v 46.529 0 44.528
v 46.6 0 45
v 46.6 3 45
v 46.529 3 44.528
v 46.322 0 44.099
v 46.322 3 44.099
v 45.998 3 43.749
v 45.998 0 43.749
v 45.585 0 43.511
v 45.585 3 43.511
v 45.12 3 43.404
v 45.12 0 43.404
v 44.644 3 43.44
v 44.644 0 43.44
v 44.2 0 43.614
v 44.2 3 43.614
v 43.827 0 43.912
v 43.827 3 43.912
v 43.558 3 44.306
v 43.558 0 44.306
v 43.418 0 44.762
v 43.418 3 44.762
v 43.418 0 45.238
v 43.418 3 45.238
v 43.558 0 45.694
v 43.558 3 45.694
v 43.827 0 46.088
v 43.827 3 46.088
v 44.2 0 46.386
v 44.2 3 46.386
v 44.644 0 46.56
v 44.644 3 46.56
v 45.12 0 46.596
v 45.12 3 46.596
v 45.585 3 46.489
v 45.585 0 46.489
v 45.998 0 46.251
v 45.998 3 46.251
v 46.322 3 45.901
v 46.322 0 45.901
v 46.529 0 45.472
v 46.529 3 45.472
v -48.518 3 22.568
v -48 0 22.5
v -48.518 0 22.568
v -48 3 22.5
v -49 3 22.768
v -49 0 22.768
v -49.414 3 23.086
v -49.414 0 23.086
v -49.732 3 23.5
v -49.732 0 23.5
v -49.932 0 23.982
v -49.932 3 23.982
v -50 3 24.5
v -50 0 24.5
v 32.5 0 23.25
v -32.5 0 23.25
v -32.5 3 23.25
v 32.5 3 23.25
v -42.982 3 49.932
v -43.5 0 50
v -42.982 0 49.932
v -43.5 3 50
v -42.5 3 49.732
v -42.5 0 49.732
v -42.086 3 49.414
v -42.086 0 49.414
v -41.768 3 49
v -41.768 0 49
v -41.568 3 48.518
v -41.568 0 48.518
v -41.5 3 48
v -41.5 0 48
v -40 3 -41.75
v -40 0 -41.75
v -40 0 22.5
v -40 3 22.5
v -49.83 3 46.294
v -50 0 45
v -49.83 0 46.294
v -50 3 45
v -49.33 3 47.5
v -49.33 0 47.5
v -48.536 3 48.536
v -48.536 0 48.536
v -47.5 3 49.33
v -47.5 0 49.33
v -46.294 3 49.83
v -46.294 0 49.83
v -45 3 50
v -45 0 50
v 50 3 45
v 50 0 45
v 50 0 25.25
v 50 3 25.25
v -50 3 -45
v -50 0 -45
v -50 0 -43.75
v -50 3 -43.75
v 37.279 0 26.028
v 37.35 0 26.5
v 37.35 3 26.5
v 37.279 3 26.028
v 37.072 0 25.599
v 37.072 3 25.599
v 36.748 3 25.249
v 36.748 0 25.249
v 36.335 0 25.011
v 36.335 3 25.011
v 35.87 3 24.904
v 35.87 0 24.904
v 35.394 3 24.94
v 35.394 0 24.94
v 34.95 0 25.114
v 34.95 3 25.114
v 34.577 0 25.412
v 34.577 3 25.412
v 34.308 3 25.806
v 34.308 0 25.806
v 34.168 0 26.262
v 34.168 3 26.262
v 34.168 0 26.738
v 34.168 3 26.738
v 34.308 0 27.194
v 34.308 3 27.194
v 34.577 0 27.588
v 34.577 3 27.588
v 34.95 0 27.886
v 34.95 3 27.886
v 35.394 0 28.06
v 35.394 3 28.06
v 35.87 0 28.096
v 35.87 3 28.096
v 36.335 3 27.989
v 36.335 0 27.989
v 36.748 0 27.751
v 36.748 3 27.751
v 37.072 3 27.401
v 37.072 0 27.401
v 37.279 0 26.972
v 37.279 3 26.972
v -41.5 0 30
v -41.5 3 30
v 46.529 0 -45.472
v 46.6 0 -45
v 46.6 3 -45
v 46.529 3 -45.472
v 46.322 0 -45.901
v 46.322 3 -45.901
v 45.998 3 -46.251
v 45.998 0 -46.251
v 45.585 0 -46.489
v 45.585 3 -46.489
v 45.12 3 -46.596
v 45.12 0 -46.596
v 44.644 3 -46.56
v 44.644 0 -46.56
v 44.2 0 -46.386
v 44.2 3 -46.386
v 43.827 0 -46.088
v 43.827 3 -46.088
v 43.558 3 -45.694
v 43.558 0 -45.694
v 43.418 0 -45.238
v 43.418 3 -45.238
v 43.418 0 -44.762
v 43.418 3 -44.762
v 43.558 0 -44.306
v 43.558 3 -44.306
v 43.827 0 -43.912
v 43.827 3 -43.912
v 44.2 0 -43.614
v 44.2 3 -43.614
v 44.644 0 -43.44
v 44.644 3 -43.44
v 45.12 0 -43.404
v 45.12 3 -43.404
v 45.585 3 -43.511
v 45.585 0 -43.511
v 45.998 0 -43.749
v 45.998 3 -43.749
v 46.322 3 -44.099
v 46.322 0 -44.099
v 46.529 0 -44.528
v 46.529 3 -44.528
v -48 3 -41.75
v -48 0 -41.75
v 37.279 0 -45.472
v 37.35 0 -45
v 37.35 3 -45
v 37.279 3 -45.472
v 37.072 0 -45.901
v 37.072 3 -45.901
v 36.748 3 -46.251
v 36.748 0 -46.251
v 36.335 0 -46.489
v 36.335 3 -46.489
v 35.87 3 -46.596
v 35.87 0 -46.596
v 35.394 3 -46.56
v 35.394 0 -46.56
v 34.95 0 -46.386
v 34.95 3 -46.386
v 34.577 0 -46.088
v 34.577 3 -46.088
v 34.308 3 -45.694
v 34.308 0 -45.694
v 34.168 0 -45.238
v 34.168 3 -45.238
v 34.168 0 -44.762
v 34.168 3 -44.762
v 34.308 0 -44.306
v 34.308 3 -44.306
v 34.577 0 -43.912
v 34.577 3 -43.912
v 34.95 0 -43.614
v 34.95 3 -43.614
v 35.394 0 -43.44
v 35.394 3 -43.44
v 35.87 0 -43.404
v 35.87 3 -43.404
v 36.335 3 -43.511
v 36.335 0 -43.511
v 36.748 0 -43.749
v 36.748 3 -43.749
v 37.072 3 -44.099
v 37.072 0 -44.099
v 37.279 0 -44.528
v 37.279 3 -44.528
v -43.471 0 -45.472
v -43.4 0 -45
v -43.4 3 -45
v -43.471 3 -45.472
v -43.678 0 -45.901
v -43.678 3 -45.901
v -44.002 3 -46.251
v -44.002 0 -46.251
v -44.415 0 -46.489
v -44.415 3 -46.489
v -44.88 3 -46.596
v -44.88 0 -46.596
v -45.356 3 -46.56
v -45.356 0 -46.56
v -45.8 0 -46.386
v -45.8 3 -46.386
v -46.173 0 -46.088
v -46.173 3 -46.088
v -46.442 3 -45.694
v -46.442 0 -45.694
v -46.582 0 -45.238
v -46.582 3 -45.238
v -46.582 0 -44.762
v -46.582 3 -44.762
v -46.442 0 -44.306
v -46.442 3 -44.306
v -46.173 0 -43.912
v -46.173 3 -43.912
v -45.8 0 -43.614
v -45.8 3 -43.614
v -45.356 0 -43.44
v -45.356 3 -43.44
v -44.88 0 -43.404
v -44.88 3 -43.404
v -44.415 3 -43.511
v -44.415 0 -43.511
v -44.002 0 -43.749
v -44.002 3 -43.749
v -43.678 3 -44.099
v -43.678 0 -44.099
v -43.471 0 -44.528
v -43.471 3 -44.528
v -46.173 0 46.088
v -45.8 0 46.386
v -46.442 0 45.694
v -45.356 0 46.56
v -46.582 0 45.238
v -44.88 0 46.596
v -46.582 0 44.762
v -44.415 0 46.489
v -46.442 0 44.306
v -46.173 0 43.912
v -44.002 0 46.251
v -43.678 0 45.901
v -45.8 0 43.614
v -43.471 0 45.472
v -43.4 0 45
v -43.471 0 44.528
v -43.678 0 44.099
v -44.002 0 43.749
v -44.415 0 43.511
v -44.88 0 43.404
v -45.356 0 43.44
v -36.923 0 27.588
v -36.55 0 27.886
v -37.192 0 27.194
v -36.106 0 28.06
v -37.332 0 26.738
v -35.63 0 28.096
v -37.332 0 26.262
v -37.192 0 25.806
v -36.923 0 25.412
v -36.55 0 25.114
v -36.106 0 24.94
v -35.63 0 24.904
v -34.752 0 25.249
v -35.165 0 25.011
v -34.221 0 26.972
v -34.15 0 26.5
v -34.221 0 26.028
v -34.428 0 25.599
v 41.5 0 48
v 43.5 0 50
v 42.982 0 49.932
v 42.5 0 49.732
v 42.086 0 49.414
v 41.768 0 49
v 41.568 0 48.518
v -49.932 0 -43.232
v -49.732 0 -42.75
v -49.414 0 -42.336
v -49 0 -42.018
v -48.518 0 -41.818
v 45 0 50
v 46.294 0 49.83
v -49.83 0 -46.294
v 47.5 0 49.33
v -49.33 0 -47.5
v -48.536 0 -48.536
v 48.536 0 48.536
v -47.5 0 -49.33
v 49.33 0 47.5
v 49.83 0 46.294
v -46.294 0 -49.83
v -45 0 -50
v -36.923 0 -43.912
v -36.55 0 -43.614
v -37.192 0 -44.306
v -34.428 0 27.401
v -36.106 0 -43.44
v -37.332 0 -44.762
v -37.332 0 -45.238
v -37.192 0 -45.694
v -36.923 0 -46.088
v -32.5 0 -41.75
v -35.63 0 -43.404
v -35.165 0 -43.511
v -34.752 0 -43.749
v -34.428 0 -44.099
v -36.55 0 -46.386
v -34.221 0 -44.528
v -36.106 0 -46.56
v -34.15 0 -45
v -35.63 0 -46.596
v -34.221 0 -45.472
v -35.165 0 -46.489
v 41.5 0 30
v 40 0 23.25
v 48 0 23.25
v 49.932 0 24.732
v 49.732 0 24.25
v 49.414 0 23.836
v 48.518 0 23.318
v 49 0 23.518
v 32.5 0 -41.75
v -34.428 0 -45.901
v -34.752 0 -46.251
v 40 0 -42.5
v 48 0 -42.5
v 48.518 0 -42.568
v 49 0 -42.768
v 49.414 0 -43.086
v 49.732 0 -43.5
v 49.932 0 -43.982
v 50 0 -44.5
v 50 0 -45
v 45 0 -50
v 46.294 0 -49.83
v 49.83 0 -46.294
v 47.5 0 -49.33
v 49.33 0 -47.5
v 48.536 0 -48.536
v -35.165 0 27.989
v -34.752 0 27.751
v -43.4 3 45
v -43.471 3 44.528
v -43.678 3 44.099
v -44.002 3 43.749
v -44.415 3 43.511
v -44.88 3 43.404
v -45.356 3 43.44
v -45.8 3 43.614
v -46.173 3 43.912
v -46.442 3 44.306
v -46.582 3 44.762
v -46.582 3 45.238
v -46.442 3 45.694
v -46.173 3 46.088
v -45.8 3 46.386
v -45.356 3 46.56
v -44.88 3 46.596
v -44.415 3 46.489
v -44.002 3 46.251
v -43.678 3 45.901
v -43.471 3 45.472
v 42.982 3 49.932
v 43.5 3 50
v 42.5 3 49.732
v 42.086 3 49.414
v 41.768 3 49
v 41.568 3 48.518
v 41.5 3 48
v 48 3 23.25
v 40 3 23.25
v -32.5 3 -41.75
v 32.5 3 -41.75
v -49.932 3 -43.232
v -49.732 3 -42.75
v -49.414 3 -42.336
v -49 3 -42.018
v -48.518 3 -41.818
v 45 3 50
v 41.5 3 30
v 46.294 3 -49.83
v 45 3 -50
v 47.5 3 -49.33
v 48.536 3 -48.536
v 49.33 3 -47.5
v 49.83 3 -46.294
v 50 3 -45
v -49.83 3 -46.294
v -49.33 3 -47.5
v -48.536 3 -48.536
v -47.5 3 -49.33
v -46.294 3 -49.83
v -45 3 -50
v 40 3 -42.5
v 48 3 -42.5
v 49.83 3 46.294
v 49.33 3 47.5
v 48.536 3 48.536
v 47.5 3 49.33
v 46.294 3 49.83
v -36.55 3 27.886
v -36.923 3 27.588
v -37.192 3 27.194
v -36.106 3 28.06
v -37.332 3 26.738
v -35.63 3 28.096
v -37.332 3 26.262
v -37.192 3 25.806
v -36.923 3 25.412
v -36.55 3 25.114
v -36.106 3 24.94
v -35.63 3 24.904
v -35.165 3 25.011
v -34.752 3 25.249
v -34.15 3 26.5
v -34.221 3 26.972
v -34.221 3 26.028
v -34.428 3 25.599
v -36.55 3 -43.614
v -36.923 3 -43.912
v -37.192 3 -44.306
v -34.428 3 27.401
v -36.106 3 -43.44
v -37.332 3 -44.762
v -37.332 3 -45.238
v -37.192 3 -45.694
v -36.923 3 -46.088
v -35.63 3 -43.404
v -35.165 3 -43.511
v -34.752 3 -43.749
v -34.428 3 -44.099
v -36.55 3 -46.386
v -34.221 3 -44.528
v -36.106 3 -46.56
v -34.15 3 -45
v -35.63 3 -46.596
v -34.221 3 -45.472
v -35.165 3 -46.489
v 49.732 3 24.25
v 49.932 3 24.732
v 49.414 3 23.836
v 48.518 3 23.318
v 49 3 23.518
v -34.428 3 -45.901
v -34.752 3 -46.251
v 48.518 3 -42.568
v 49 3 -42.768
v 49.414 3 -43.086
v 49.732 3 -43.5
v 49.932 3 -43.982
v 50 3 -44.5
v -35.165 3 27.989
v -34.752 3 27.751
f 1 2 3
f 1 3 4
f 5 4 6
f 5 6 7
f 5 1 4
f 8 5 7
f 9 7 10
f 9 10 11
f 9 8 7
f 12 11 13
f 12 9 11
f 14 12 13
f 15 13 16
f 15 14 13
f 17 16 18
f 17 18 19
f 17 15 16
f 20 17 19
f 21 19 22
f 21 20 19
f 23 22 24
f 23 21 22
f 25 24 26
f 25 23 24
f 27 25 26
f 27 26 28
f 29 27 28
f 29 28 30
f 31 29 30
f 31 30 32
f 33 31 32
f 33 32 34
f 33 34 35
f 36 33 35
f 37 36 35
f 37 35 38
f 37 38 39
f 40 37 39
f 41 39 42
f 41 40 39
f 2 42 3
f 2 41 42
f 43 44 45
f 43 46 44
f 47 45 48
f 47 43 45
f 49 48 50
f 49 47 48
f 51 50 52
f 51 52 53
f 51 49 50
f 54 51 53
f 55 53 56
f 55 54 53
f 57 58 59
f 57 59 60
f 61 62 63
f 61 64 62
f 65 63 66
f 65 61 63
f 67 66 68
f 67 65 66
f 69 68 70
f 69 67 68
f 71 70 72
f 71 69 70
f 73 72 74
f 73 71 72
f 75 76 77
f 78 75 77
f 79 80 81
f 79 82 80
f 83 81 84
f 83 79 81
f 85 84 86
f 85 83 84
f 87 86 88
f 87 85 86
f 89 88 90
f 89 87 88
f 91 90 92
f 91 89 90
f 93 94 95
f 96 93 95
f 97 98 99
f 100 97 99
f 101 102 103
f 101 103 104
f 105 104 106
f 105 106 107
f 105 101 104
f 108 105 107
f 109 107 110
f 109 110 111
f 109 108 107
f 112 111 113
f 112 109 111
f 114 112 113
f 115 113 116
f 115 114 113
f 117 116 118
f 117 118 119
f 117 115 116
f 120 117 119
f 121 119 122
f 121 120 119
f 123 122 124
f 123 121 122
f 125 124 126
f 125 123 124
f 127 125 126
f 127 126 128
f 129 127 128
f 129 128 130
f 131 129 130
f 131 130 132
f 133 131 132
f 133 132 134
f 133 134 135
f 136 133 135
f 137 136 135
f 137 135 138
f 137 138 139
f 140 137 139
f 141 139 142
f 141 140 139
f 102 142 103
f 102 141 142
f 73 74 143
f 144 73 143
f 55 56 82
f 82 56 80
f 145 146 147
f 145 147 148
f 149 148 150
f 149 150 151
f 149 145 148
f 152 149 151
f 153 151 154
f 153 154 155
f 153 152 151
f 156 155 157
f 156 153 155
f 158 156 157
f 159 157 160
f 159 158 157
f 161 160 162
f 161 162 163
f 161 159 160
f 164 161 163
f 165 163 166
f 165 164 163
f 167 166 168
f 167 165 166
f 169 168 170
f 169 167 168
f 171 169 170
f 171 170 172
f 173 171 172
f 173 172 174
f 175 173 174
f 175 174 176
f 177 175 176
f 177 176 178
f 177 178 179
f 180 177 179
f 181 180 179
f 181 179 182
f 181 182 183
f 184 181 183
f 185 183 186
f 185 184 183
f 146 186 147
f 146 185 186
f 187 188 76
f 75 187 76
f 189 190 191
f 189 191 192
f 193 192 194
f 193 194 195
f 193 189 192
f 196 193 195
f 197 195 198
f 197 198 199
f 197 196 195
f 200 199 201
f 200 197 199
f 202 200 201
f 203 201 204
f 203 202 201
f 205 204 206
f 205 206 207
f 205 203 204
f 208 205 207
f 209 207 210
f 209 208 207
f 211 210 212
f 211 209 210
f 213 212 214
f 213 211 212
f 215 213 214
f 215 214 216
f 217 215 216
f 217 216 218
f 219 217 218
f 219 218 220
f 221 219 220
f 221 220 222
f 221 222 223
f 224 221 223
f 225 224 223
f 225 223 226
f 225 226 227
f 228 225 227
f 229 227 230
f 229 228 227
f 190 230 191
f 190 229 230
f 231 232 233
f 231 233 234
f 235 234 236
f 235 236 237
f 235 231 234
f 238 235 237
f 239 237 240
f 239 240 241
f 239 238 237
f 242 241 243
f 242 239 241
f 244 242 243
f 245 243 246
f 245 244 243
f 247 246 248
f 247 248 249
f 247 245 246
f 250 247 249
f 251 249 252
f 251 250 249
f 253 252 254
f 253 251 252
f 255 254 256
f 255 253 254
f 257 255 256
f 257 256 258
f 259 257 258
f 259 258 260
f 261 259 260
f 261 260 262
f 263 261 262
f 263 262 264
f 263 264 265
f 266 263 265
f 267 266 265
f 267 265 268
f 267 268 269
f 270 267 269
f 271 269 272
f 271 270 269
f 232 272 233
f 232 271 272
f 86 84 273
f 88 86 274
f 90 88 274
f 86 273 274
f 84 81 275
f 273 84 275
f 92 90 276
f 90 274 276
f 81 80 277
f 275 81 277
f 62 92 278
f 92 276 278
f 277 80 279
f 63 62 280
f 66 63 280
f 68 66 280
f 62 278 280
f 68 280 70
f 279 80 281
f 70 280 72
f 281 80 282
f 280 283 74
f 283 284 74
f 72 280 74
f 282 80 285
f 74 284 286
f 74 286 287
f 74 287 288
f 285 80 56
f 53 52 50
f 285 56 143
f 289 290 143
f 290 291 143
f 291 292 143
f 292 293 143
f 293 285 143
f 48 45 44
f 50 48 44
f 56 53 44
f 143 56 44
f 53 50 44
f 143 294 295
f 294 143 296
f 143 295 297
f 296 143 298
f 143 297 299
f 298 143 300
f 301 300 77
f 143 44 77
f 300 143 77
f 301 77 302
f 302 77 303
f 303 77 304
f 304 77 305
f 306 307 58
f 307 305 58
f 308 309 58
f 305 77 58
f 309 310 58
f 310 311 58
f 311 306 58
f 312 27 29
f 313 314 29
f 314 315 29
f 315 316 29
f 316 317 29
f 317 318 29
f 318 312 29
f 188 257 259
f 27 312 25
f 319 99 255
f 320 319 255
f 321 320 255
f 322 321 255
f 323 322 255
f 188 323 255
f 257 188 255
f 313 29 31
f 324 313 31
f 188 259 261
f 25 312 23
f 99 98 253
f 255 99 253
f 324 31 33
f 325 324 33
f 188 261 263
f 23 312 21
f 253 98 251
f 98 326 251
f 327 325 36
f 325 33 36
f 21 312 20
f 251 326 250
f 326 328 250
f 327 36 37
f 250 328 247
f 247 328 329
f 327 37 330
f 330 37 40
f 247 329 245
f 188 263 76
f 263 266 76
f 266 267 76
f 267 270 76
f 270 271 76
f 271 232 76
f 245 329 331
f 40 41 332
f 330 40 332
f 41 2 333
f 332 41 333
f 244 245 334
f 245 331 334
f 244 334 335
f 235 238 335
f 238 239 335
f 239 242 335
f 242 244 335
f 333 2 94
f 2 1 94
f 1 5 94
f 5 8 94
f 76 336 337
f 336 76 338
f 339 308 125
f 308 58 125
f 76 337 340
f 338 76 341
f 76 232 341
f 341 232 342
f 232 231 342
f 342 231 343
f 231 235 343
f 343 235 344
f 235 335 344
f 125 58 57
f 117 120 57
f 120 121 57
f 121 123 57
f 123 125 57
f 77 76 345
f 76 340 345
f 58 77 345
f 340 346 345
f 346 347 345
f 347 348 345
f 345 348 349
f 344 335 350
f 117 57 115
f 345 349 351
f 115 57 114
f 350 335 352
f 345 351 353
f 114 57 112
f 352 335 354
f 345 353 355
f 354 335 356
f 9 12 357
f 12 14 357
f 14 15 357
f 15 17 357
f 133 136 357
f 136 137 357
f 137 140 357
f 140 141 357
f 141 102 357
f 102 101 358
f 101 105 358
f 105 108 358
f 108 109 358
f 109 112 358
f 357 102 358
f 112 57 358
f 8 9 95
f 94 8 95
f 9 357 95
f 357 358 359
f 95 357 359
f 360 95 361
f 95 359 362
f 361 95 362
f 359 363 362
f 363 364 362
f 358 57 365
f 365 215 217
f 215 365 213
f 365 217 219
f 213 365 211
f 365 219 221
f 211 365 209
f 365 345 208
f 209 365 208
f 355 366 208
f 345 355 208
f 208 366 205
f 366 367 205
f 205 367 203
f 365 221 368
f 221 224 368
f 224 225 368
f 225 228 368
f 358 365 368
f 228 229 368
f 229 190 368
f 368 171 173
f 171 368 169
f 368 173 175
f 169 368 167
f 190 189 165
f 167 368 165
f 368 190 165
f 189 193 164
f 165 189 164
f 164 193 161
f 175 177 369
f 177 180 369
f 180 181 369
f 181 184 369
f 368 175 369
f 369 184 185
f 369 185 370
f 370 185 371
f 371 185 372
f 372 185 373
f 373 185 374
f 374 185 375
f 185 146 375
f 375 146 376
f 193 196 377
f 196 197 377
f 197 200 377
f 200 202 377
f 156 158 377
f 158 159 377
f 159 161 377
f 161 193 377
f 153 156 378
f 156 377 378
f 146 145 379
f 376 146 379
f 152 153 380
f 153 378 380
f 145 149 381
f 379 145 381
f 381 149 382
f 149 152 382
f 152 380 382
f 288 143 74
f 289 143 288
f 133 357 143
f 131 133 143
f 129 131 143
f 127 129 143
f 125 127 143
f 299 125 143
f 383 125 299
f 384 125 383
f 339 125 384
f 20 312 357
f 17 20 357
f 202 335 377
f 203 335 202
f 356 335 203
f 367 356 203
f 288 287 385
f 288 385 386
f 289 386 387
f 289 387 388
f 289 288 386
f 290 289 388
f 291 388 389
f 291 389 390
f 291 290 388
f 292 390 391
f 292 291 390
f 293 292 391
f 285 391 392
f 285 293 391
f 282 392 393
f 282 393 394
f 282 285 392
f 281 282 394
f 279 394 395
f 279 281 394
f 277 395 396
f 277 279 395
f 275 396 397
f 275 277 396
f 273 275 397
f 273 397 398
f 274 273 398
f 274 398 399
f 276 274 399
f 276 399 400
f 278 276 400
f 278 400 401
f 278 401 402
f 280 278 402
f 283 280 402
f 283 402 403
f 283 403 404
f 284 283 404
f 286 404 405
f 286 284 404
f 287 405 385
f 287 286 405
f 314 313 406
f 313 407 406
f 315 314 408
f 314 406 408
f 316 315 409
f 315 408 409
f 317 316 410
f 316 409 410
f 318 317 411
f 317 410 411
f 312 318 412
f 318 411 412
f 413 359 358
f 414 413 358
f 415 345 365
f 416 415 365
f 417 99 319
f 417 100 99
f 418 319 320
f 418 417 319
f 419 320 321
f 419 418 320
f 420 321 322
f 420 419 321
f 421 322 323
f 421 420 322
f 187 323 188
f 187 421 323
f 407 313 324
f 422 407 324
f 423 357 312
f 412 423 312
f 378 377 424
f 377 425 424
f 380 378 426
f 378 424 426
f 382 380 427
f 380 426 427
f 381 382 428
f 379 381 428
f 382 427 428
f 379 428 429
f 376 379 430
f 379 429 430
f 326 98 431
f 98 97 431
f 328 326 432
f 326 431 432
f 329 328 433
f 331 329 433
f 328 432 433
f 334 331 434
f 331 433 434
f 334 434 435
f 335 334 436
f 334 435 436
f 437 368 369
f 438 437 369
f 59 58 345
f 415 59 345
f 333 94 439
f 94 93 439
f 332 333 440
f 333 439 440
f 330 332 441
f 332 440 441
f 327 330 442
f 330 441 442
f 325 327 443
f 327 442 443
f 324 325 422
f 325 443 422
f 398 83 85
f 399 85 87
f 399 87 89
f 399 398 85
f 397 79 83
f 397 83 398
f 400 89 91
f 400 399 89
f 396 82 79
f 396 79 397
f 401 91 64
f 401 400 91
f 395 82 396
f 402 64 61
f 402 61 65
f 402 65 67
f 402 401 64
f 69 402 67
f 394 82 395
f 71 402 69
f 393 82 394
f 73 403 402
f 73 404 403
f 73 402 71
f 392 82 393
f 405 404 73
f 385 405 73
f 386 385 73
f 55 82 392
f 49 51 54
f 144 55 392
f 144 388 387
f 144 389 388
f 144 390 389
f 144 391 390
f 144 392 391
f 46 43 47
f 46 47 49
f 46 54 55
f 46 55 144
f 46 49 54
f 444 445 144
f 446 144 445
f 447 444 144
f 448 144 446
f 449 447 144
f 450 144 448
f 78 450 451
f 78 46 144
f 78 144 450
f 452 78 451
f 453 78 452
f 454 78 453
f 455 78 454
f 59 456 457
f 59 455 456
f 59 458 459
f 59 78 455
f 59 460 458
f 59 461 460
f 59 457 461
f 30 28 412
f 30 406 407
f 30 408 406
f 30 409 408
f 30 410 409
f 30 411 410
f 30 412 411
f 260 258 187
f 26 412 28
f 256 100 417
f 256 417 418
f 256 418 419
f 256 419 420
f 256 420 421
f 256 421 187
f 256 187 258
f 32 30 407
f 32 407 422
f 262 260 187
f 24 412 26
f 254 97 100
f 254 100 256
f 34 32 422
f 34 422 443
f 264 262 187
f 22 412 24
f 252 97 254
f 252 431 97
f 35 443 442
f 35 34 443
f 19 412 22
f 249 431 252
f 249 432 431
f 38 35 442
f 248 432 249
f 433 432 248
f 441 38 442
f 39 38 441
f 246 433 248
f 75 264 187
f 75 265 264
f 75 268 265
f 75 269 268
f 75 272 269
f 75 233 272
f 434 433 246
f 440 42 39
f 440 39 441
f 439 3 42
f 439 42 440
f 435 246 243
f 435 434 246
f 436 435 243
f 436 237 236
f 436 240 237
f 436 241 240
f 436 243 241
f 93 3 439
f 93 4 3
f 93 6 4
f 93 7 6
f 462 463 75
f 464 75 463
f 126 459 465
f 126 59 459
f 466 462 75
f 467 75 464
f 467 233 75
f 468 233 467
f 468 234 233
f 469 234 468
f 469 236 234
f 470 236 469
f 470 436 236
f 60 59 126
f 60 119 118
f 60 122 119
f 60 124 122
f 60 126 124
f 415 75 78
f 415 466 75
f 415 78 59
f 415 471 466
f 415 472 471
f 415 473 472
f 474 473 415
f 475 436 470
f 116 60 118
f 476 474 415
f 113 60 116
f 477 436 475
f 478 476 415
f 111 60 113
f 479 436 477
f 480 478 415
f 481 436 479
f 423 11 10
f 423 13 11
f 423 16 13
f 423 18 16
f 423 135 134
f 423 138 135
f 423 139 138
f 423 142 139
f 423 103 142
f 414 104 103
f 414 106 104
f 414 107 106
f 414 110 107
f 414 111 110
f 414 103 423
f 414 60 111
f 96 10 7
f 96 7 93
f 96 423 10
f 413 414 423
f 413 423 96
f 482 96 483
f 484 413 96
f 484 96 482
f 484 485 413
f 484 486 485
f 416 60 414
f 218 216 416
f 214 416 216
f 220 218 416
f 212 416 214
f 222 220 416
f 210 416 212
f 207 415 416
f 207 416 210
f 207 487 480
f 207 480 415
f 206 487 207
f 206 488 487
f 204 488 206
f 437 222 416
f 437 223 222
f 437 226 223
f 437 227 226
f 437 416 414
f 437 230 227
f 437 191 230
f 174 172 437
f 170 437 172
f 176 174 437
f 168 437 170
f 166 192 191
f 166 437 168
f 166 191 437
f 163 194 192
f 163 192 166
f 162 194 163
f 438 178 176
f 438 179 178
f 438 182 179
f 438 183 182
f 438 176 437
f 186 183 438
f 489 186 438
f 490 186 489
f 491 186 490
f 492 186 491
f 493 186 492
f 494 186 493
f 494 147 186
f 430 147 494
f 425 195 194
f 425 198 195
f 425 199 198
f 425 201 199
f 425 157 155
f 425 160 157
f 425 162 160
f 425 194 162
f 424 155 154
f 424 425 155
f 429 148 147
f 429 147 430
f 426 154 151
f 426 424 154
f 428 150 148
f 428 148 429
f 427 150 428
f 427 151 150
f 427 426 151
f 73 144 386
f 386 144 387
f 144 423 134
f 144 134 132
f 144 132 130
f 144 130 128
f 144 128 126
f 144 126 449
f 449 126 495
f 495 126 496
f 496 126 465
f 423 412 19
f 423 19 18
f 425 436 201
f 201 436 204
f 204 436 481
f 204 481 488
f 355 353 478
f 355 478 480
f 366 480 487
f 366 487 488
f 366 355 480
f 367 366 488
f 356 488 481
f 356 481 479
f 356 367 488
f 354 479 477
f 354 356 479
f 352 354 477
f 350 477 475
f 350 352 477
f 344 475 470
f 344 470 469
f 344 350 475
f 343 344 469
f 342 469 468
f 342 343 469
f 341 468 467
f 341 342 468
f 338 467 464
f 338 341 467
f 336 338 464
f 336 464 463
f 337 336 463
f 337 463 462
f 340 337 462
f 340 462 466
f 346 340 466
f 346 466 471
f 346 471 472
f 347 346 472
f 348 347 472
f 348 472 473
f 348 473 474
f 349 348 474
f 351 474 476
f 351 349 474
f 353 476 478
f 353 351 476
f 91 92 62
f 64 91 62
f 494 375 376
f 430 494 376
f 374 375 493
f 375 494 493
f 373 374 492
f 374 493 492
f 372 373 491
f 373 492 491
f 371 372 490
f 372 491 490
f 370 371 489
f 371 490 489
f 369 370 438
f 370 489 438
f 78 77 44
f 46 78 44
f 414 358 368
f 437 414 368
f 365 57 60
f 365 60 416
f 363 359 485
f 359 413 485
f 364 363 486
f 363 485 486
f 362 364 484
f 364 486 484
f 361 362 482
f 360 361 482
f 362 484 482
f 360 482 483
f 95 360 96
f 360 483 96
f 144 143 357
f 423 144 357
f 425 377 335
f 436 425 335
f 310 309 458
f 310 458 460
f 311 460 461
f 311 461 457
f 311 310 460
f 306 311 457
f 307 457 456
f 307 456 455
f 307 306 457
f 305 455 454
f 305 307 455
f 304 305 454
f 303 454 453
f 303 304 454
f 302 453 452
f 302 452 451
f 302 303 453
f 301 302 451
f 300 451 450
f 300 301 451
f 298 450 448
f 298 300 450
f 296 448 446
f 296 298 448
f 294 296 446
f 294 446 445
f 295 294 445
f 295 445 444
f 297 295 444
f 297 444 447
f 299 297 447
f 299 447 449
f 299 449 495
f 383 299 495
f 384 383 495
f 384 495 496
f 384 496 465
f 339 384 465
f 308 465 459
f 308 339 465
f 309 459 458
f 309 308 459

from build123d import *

# Parameters (mm, degrees)
SKETCH1_R           = 1.6
SKETCH1_W           = 65
SKETCH1_H           = 65
BOSS_EXTRUDE1_DEPTH = 3
FILLET1_R           = 2
FILLET2_R           = 5


with BuildPart() as part:
    # Sketch1 → Boss-Extrude1 (new body)
    with BuildSketch(Plane(origin=(0, 0, 0), x_dir=(1, 0, 0), z_dir=(0, 1, 0))):
        Polygon((-50, 50), (-50, 41.75), (-40, 41.75), (-40, -22.5), (-50, -22.5), (-50, -50), (-41.5, -50), (-41.5, -30), (41.5, -30), (41.5, -50), (50, -50), (50, -23.25), (40, -23.25), (40, 42.5), (50, 42.5), (50, 50), align=None)
        with Locations((-45, -45)):
            Circle(SKETCH1_R, mode=Mode.SUBTRACT)
        with Locations((-35.75, -26.5)):
            Circle(SKETCH1_R, mode=Mode.SUBTRACT)
        with Locations((45, -45)):
            Circle(SKETCH1_R, mode=Mode.SUBTRACT)
        with Locations((35.75, -26.5)):
            Circle(SKETCH1_R, mode=Mode.SUBTRACT)
        with Locations((0, 9.25)):
            Rectangle(SKETCH1_W, SKETCH1_H, mode=Mode.SUBTRACT)
        with Locations((-45, 45)):
            Circle(SKETCH1_R, mode=Mode.SUBTRACT)
        with Locations((-35.75, 45)):
            Circle(SKETCH1_R, mode=Mode.SUBTRACT)
        with Locations((35.75, 45)):
            Circle(SKETCH1_R, mode=Mode.SUBTRACT)
        with Locations((45, 45)):
            Circle(SKETCH1_R, mode=Mode.SUBTRACT)
    extrude(amount=BOSS_EXTRUDE1_DEPTH)

    # Fillet1
    fillet1_edges = [part.edges().sort_by_distance(p)[0] for p in [
        (50, 1.5, 23.25),
        (41.5, 1.5, 50),
        (-41.5, 1.5, 50),
        (-50, 1.5, 22.5),
        (-50, 1.5, -41.75),
        (50, 1.5, -42.5),
    ]]
    fillet(fillet1_edges, radius=FILLET1_R)

    # Fillet2
    fillet2_edges = [part.edges().sort_by_distance(p)[0] for p in [
        (50, 1.5, 50),
        (-50, 1.5, 50),
        (-50, 1.5, -50),
        (50, 1.5, -50),
    ]]
    fillet(fillet2_edges, radius=FILLET2_R)


solid = part.part
